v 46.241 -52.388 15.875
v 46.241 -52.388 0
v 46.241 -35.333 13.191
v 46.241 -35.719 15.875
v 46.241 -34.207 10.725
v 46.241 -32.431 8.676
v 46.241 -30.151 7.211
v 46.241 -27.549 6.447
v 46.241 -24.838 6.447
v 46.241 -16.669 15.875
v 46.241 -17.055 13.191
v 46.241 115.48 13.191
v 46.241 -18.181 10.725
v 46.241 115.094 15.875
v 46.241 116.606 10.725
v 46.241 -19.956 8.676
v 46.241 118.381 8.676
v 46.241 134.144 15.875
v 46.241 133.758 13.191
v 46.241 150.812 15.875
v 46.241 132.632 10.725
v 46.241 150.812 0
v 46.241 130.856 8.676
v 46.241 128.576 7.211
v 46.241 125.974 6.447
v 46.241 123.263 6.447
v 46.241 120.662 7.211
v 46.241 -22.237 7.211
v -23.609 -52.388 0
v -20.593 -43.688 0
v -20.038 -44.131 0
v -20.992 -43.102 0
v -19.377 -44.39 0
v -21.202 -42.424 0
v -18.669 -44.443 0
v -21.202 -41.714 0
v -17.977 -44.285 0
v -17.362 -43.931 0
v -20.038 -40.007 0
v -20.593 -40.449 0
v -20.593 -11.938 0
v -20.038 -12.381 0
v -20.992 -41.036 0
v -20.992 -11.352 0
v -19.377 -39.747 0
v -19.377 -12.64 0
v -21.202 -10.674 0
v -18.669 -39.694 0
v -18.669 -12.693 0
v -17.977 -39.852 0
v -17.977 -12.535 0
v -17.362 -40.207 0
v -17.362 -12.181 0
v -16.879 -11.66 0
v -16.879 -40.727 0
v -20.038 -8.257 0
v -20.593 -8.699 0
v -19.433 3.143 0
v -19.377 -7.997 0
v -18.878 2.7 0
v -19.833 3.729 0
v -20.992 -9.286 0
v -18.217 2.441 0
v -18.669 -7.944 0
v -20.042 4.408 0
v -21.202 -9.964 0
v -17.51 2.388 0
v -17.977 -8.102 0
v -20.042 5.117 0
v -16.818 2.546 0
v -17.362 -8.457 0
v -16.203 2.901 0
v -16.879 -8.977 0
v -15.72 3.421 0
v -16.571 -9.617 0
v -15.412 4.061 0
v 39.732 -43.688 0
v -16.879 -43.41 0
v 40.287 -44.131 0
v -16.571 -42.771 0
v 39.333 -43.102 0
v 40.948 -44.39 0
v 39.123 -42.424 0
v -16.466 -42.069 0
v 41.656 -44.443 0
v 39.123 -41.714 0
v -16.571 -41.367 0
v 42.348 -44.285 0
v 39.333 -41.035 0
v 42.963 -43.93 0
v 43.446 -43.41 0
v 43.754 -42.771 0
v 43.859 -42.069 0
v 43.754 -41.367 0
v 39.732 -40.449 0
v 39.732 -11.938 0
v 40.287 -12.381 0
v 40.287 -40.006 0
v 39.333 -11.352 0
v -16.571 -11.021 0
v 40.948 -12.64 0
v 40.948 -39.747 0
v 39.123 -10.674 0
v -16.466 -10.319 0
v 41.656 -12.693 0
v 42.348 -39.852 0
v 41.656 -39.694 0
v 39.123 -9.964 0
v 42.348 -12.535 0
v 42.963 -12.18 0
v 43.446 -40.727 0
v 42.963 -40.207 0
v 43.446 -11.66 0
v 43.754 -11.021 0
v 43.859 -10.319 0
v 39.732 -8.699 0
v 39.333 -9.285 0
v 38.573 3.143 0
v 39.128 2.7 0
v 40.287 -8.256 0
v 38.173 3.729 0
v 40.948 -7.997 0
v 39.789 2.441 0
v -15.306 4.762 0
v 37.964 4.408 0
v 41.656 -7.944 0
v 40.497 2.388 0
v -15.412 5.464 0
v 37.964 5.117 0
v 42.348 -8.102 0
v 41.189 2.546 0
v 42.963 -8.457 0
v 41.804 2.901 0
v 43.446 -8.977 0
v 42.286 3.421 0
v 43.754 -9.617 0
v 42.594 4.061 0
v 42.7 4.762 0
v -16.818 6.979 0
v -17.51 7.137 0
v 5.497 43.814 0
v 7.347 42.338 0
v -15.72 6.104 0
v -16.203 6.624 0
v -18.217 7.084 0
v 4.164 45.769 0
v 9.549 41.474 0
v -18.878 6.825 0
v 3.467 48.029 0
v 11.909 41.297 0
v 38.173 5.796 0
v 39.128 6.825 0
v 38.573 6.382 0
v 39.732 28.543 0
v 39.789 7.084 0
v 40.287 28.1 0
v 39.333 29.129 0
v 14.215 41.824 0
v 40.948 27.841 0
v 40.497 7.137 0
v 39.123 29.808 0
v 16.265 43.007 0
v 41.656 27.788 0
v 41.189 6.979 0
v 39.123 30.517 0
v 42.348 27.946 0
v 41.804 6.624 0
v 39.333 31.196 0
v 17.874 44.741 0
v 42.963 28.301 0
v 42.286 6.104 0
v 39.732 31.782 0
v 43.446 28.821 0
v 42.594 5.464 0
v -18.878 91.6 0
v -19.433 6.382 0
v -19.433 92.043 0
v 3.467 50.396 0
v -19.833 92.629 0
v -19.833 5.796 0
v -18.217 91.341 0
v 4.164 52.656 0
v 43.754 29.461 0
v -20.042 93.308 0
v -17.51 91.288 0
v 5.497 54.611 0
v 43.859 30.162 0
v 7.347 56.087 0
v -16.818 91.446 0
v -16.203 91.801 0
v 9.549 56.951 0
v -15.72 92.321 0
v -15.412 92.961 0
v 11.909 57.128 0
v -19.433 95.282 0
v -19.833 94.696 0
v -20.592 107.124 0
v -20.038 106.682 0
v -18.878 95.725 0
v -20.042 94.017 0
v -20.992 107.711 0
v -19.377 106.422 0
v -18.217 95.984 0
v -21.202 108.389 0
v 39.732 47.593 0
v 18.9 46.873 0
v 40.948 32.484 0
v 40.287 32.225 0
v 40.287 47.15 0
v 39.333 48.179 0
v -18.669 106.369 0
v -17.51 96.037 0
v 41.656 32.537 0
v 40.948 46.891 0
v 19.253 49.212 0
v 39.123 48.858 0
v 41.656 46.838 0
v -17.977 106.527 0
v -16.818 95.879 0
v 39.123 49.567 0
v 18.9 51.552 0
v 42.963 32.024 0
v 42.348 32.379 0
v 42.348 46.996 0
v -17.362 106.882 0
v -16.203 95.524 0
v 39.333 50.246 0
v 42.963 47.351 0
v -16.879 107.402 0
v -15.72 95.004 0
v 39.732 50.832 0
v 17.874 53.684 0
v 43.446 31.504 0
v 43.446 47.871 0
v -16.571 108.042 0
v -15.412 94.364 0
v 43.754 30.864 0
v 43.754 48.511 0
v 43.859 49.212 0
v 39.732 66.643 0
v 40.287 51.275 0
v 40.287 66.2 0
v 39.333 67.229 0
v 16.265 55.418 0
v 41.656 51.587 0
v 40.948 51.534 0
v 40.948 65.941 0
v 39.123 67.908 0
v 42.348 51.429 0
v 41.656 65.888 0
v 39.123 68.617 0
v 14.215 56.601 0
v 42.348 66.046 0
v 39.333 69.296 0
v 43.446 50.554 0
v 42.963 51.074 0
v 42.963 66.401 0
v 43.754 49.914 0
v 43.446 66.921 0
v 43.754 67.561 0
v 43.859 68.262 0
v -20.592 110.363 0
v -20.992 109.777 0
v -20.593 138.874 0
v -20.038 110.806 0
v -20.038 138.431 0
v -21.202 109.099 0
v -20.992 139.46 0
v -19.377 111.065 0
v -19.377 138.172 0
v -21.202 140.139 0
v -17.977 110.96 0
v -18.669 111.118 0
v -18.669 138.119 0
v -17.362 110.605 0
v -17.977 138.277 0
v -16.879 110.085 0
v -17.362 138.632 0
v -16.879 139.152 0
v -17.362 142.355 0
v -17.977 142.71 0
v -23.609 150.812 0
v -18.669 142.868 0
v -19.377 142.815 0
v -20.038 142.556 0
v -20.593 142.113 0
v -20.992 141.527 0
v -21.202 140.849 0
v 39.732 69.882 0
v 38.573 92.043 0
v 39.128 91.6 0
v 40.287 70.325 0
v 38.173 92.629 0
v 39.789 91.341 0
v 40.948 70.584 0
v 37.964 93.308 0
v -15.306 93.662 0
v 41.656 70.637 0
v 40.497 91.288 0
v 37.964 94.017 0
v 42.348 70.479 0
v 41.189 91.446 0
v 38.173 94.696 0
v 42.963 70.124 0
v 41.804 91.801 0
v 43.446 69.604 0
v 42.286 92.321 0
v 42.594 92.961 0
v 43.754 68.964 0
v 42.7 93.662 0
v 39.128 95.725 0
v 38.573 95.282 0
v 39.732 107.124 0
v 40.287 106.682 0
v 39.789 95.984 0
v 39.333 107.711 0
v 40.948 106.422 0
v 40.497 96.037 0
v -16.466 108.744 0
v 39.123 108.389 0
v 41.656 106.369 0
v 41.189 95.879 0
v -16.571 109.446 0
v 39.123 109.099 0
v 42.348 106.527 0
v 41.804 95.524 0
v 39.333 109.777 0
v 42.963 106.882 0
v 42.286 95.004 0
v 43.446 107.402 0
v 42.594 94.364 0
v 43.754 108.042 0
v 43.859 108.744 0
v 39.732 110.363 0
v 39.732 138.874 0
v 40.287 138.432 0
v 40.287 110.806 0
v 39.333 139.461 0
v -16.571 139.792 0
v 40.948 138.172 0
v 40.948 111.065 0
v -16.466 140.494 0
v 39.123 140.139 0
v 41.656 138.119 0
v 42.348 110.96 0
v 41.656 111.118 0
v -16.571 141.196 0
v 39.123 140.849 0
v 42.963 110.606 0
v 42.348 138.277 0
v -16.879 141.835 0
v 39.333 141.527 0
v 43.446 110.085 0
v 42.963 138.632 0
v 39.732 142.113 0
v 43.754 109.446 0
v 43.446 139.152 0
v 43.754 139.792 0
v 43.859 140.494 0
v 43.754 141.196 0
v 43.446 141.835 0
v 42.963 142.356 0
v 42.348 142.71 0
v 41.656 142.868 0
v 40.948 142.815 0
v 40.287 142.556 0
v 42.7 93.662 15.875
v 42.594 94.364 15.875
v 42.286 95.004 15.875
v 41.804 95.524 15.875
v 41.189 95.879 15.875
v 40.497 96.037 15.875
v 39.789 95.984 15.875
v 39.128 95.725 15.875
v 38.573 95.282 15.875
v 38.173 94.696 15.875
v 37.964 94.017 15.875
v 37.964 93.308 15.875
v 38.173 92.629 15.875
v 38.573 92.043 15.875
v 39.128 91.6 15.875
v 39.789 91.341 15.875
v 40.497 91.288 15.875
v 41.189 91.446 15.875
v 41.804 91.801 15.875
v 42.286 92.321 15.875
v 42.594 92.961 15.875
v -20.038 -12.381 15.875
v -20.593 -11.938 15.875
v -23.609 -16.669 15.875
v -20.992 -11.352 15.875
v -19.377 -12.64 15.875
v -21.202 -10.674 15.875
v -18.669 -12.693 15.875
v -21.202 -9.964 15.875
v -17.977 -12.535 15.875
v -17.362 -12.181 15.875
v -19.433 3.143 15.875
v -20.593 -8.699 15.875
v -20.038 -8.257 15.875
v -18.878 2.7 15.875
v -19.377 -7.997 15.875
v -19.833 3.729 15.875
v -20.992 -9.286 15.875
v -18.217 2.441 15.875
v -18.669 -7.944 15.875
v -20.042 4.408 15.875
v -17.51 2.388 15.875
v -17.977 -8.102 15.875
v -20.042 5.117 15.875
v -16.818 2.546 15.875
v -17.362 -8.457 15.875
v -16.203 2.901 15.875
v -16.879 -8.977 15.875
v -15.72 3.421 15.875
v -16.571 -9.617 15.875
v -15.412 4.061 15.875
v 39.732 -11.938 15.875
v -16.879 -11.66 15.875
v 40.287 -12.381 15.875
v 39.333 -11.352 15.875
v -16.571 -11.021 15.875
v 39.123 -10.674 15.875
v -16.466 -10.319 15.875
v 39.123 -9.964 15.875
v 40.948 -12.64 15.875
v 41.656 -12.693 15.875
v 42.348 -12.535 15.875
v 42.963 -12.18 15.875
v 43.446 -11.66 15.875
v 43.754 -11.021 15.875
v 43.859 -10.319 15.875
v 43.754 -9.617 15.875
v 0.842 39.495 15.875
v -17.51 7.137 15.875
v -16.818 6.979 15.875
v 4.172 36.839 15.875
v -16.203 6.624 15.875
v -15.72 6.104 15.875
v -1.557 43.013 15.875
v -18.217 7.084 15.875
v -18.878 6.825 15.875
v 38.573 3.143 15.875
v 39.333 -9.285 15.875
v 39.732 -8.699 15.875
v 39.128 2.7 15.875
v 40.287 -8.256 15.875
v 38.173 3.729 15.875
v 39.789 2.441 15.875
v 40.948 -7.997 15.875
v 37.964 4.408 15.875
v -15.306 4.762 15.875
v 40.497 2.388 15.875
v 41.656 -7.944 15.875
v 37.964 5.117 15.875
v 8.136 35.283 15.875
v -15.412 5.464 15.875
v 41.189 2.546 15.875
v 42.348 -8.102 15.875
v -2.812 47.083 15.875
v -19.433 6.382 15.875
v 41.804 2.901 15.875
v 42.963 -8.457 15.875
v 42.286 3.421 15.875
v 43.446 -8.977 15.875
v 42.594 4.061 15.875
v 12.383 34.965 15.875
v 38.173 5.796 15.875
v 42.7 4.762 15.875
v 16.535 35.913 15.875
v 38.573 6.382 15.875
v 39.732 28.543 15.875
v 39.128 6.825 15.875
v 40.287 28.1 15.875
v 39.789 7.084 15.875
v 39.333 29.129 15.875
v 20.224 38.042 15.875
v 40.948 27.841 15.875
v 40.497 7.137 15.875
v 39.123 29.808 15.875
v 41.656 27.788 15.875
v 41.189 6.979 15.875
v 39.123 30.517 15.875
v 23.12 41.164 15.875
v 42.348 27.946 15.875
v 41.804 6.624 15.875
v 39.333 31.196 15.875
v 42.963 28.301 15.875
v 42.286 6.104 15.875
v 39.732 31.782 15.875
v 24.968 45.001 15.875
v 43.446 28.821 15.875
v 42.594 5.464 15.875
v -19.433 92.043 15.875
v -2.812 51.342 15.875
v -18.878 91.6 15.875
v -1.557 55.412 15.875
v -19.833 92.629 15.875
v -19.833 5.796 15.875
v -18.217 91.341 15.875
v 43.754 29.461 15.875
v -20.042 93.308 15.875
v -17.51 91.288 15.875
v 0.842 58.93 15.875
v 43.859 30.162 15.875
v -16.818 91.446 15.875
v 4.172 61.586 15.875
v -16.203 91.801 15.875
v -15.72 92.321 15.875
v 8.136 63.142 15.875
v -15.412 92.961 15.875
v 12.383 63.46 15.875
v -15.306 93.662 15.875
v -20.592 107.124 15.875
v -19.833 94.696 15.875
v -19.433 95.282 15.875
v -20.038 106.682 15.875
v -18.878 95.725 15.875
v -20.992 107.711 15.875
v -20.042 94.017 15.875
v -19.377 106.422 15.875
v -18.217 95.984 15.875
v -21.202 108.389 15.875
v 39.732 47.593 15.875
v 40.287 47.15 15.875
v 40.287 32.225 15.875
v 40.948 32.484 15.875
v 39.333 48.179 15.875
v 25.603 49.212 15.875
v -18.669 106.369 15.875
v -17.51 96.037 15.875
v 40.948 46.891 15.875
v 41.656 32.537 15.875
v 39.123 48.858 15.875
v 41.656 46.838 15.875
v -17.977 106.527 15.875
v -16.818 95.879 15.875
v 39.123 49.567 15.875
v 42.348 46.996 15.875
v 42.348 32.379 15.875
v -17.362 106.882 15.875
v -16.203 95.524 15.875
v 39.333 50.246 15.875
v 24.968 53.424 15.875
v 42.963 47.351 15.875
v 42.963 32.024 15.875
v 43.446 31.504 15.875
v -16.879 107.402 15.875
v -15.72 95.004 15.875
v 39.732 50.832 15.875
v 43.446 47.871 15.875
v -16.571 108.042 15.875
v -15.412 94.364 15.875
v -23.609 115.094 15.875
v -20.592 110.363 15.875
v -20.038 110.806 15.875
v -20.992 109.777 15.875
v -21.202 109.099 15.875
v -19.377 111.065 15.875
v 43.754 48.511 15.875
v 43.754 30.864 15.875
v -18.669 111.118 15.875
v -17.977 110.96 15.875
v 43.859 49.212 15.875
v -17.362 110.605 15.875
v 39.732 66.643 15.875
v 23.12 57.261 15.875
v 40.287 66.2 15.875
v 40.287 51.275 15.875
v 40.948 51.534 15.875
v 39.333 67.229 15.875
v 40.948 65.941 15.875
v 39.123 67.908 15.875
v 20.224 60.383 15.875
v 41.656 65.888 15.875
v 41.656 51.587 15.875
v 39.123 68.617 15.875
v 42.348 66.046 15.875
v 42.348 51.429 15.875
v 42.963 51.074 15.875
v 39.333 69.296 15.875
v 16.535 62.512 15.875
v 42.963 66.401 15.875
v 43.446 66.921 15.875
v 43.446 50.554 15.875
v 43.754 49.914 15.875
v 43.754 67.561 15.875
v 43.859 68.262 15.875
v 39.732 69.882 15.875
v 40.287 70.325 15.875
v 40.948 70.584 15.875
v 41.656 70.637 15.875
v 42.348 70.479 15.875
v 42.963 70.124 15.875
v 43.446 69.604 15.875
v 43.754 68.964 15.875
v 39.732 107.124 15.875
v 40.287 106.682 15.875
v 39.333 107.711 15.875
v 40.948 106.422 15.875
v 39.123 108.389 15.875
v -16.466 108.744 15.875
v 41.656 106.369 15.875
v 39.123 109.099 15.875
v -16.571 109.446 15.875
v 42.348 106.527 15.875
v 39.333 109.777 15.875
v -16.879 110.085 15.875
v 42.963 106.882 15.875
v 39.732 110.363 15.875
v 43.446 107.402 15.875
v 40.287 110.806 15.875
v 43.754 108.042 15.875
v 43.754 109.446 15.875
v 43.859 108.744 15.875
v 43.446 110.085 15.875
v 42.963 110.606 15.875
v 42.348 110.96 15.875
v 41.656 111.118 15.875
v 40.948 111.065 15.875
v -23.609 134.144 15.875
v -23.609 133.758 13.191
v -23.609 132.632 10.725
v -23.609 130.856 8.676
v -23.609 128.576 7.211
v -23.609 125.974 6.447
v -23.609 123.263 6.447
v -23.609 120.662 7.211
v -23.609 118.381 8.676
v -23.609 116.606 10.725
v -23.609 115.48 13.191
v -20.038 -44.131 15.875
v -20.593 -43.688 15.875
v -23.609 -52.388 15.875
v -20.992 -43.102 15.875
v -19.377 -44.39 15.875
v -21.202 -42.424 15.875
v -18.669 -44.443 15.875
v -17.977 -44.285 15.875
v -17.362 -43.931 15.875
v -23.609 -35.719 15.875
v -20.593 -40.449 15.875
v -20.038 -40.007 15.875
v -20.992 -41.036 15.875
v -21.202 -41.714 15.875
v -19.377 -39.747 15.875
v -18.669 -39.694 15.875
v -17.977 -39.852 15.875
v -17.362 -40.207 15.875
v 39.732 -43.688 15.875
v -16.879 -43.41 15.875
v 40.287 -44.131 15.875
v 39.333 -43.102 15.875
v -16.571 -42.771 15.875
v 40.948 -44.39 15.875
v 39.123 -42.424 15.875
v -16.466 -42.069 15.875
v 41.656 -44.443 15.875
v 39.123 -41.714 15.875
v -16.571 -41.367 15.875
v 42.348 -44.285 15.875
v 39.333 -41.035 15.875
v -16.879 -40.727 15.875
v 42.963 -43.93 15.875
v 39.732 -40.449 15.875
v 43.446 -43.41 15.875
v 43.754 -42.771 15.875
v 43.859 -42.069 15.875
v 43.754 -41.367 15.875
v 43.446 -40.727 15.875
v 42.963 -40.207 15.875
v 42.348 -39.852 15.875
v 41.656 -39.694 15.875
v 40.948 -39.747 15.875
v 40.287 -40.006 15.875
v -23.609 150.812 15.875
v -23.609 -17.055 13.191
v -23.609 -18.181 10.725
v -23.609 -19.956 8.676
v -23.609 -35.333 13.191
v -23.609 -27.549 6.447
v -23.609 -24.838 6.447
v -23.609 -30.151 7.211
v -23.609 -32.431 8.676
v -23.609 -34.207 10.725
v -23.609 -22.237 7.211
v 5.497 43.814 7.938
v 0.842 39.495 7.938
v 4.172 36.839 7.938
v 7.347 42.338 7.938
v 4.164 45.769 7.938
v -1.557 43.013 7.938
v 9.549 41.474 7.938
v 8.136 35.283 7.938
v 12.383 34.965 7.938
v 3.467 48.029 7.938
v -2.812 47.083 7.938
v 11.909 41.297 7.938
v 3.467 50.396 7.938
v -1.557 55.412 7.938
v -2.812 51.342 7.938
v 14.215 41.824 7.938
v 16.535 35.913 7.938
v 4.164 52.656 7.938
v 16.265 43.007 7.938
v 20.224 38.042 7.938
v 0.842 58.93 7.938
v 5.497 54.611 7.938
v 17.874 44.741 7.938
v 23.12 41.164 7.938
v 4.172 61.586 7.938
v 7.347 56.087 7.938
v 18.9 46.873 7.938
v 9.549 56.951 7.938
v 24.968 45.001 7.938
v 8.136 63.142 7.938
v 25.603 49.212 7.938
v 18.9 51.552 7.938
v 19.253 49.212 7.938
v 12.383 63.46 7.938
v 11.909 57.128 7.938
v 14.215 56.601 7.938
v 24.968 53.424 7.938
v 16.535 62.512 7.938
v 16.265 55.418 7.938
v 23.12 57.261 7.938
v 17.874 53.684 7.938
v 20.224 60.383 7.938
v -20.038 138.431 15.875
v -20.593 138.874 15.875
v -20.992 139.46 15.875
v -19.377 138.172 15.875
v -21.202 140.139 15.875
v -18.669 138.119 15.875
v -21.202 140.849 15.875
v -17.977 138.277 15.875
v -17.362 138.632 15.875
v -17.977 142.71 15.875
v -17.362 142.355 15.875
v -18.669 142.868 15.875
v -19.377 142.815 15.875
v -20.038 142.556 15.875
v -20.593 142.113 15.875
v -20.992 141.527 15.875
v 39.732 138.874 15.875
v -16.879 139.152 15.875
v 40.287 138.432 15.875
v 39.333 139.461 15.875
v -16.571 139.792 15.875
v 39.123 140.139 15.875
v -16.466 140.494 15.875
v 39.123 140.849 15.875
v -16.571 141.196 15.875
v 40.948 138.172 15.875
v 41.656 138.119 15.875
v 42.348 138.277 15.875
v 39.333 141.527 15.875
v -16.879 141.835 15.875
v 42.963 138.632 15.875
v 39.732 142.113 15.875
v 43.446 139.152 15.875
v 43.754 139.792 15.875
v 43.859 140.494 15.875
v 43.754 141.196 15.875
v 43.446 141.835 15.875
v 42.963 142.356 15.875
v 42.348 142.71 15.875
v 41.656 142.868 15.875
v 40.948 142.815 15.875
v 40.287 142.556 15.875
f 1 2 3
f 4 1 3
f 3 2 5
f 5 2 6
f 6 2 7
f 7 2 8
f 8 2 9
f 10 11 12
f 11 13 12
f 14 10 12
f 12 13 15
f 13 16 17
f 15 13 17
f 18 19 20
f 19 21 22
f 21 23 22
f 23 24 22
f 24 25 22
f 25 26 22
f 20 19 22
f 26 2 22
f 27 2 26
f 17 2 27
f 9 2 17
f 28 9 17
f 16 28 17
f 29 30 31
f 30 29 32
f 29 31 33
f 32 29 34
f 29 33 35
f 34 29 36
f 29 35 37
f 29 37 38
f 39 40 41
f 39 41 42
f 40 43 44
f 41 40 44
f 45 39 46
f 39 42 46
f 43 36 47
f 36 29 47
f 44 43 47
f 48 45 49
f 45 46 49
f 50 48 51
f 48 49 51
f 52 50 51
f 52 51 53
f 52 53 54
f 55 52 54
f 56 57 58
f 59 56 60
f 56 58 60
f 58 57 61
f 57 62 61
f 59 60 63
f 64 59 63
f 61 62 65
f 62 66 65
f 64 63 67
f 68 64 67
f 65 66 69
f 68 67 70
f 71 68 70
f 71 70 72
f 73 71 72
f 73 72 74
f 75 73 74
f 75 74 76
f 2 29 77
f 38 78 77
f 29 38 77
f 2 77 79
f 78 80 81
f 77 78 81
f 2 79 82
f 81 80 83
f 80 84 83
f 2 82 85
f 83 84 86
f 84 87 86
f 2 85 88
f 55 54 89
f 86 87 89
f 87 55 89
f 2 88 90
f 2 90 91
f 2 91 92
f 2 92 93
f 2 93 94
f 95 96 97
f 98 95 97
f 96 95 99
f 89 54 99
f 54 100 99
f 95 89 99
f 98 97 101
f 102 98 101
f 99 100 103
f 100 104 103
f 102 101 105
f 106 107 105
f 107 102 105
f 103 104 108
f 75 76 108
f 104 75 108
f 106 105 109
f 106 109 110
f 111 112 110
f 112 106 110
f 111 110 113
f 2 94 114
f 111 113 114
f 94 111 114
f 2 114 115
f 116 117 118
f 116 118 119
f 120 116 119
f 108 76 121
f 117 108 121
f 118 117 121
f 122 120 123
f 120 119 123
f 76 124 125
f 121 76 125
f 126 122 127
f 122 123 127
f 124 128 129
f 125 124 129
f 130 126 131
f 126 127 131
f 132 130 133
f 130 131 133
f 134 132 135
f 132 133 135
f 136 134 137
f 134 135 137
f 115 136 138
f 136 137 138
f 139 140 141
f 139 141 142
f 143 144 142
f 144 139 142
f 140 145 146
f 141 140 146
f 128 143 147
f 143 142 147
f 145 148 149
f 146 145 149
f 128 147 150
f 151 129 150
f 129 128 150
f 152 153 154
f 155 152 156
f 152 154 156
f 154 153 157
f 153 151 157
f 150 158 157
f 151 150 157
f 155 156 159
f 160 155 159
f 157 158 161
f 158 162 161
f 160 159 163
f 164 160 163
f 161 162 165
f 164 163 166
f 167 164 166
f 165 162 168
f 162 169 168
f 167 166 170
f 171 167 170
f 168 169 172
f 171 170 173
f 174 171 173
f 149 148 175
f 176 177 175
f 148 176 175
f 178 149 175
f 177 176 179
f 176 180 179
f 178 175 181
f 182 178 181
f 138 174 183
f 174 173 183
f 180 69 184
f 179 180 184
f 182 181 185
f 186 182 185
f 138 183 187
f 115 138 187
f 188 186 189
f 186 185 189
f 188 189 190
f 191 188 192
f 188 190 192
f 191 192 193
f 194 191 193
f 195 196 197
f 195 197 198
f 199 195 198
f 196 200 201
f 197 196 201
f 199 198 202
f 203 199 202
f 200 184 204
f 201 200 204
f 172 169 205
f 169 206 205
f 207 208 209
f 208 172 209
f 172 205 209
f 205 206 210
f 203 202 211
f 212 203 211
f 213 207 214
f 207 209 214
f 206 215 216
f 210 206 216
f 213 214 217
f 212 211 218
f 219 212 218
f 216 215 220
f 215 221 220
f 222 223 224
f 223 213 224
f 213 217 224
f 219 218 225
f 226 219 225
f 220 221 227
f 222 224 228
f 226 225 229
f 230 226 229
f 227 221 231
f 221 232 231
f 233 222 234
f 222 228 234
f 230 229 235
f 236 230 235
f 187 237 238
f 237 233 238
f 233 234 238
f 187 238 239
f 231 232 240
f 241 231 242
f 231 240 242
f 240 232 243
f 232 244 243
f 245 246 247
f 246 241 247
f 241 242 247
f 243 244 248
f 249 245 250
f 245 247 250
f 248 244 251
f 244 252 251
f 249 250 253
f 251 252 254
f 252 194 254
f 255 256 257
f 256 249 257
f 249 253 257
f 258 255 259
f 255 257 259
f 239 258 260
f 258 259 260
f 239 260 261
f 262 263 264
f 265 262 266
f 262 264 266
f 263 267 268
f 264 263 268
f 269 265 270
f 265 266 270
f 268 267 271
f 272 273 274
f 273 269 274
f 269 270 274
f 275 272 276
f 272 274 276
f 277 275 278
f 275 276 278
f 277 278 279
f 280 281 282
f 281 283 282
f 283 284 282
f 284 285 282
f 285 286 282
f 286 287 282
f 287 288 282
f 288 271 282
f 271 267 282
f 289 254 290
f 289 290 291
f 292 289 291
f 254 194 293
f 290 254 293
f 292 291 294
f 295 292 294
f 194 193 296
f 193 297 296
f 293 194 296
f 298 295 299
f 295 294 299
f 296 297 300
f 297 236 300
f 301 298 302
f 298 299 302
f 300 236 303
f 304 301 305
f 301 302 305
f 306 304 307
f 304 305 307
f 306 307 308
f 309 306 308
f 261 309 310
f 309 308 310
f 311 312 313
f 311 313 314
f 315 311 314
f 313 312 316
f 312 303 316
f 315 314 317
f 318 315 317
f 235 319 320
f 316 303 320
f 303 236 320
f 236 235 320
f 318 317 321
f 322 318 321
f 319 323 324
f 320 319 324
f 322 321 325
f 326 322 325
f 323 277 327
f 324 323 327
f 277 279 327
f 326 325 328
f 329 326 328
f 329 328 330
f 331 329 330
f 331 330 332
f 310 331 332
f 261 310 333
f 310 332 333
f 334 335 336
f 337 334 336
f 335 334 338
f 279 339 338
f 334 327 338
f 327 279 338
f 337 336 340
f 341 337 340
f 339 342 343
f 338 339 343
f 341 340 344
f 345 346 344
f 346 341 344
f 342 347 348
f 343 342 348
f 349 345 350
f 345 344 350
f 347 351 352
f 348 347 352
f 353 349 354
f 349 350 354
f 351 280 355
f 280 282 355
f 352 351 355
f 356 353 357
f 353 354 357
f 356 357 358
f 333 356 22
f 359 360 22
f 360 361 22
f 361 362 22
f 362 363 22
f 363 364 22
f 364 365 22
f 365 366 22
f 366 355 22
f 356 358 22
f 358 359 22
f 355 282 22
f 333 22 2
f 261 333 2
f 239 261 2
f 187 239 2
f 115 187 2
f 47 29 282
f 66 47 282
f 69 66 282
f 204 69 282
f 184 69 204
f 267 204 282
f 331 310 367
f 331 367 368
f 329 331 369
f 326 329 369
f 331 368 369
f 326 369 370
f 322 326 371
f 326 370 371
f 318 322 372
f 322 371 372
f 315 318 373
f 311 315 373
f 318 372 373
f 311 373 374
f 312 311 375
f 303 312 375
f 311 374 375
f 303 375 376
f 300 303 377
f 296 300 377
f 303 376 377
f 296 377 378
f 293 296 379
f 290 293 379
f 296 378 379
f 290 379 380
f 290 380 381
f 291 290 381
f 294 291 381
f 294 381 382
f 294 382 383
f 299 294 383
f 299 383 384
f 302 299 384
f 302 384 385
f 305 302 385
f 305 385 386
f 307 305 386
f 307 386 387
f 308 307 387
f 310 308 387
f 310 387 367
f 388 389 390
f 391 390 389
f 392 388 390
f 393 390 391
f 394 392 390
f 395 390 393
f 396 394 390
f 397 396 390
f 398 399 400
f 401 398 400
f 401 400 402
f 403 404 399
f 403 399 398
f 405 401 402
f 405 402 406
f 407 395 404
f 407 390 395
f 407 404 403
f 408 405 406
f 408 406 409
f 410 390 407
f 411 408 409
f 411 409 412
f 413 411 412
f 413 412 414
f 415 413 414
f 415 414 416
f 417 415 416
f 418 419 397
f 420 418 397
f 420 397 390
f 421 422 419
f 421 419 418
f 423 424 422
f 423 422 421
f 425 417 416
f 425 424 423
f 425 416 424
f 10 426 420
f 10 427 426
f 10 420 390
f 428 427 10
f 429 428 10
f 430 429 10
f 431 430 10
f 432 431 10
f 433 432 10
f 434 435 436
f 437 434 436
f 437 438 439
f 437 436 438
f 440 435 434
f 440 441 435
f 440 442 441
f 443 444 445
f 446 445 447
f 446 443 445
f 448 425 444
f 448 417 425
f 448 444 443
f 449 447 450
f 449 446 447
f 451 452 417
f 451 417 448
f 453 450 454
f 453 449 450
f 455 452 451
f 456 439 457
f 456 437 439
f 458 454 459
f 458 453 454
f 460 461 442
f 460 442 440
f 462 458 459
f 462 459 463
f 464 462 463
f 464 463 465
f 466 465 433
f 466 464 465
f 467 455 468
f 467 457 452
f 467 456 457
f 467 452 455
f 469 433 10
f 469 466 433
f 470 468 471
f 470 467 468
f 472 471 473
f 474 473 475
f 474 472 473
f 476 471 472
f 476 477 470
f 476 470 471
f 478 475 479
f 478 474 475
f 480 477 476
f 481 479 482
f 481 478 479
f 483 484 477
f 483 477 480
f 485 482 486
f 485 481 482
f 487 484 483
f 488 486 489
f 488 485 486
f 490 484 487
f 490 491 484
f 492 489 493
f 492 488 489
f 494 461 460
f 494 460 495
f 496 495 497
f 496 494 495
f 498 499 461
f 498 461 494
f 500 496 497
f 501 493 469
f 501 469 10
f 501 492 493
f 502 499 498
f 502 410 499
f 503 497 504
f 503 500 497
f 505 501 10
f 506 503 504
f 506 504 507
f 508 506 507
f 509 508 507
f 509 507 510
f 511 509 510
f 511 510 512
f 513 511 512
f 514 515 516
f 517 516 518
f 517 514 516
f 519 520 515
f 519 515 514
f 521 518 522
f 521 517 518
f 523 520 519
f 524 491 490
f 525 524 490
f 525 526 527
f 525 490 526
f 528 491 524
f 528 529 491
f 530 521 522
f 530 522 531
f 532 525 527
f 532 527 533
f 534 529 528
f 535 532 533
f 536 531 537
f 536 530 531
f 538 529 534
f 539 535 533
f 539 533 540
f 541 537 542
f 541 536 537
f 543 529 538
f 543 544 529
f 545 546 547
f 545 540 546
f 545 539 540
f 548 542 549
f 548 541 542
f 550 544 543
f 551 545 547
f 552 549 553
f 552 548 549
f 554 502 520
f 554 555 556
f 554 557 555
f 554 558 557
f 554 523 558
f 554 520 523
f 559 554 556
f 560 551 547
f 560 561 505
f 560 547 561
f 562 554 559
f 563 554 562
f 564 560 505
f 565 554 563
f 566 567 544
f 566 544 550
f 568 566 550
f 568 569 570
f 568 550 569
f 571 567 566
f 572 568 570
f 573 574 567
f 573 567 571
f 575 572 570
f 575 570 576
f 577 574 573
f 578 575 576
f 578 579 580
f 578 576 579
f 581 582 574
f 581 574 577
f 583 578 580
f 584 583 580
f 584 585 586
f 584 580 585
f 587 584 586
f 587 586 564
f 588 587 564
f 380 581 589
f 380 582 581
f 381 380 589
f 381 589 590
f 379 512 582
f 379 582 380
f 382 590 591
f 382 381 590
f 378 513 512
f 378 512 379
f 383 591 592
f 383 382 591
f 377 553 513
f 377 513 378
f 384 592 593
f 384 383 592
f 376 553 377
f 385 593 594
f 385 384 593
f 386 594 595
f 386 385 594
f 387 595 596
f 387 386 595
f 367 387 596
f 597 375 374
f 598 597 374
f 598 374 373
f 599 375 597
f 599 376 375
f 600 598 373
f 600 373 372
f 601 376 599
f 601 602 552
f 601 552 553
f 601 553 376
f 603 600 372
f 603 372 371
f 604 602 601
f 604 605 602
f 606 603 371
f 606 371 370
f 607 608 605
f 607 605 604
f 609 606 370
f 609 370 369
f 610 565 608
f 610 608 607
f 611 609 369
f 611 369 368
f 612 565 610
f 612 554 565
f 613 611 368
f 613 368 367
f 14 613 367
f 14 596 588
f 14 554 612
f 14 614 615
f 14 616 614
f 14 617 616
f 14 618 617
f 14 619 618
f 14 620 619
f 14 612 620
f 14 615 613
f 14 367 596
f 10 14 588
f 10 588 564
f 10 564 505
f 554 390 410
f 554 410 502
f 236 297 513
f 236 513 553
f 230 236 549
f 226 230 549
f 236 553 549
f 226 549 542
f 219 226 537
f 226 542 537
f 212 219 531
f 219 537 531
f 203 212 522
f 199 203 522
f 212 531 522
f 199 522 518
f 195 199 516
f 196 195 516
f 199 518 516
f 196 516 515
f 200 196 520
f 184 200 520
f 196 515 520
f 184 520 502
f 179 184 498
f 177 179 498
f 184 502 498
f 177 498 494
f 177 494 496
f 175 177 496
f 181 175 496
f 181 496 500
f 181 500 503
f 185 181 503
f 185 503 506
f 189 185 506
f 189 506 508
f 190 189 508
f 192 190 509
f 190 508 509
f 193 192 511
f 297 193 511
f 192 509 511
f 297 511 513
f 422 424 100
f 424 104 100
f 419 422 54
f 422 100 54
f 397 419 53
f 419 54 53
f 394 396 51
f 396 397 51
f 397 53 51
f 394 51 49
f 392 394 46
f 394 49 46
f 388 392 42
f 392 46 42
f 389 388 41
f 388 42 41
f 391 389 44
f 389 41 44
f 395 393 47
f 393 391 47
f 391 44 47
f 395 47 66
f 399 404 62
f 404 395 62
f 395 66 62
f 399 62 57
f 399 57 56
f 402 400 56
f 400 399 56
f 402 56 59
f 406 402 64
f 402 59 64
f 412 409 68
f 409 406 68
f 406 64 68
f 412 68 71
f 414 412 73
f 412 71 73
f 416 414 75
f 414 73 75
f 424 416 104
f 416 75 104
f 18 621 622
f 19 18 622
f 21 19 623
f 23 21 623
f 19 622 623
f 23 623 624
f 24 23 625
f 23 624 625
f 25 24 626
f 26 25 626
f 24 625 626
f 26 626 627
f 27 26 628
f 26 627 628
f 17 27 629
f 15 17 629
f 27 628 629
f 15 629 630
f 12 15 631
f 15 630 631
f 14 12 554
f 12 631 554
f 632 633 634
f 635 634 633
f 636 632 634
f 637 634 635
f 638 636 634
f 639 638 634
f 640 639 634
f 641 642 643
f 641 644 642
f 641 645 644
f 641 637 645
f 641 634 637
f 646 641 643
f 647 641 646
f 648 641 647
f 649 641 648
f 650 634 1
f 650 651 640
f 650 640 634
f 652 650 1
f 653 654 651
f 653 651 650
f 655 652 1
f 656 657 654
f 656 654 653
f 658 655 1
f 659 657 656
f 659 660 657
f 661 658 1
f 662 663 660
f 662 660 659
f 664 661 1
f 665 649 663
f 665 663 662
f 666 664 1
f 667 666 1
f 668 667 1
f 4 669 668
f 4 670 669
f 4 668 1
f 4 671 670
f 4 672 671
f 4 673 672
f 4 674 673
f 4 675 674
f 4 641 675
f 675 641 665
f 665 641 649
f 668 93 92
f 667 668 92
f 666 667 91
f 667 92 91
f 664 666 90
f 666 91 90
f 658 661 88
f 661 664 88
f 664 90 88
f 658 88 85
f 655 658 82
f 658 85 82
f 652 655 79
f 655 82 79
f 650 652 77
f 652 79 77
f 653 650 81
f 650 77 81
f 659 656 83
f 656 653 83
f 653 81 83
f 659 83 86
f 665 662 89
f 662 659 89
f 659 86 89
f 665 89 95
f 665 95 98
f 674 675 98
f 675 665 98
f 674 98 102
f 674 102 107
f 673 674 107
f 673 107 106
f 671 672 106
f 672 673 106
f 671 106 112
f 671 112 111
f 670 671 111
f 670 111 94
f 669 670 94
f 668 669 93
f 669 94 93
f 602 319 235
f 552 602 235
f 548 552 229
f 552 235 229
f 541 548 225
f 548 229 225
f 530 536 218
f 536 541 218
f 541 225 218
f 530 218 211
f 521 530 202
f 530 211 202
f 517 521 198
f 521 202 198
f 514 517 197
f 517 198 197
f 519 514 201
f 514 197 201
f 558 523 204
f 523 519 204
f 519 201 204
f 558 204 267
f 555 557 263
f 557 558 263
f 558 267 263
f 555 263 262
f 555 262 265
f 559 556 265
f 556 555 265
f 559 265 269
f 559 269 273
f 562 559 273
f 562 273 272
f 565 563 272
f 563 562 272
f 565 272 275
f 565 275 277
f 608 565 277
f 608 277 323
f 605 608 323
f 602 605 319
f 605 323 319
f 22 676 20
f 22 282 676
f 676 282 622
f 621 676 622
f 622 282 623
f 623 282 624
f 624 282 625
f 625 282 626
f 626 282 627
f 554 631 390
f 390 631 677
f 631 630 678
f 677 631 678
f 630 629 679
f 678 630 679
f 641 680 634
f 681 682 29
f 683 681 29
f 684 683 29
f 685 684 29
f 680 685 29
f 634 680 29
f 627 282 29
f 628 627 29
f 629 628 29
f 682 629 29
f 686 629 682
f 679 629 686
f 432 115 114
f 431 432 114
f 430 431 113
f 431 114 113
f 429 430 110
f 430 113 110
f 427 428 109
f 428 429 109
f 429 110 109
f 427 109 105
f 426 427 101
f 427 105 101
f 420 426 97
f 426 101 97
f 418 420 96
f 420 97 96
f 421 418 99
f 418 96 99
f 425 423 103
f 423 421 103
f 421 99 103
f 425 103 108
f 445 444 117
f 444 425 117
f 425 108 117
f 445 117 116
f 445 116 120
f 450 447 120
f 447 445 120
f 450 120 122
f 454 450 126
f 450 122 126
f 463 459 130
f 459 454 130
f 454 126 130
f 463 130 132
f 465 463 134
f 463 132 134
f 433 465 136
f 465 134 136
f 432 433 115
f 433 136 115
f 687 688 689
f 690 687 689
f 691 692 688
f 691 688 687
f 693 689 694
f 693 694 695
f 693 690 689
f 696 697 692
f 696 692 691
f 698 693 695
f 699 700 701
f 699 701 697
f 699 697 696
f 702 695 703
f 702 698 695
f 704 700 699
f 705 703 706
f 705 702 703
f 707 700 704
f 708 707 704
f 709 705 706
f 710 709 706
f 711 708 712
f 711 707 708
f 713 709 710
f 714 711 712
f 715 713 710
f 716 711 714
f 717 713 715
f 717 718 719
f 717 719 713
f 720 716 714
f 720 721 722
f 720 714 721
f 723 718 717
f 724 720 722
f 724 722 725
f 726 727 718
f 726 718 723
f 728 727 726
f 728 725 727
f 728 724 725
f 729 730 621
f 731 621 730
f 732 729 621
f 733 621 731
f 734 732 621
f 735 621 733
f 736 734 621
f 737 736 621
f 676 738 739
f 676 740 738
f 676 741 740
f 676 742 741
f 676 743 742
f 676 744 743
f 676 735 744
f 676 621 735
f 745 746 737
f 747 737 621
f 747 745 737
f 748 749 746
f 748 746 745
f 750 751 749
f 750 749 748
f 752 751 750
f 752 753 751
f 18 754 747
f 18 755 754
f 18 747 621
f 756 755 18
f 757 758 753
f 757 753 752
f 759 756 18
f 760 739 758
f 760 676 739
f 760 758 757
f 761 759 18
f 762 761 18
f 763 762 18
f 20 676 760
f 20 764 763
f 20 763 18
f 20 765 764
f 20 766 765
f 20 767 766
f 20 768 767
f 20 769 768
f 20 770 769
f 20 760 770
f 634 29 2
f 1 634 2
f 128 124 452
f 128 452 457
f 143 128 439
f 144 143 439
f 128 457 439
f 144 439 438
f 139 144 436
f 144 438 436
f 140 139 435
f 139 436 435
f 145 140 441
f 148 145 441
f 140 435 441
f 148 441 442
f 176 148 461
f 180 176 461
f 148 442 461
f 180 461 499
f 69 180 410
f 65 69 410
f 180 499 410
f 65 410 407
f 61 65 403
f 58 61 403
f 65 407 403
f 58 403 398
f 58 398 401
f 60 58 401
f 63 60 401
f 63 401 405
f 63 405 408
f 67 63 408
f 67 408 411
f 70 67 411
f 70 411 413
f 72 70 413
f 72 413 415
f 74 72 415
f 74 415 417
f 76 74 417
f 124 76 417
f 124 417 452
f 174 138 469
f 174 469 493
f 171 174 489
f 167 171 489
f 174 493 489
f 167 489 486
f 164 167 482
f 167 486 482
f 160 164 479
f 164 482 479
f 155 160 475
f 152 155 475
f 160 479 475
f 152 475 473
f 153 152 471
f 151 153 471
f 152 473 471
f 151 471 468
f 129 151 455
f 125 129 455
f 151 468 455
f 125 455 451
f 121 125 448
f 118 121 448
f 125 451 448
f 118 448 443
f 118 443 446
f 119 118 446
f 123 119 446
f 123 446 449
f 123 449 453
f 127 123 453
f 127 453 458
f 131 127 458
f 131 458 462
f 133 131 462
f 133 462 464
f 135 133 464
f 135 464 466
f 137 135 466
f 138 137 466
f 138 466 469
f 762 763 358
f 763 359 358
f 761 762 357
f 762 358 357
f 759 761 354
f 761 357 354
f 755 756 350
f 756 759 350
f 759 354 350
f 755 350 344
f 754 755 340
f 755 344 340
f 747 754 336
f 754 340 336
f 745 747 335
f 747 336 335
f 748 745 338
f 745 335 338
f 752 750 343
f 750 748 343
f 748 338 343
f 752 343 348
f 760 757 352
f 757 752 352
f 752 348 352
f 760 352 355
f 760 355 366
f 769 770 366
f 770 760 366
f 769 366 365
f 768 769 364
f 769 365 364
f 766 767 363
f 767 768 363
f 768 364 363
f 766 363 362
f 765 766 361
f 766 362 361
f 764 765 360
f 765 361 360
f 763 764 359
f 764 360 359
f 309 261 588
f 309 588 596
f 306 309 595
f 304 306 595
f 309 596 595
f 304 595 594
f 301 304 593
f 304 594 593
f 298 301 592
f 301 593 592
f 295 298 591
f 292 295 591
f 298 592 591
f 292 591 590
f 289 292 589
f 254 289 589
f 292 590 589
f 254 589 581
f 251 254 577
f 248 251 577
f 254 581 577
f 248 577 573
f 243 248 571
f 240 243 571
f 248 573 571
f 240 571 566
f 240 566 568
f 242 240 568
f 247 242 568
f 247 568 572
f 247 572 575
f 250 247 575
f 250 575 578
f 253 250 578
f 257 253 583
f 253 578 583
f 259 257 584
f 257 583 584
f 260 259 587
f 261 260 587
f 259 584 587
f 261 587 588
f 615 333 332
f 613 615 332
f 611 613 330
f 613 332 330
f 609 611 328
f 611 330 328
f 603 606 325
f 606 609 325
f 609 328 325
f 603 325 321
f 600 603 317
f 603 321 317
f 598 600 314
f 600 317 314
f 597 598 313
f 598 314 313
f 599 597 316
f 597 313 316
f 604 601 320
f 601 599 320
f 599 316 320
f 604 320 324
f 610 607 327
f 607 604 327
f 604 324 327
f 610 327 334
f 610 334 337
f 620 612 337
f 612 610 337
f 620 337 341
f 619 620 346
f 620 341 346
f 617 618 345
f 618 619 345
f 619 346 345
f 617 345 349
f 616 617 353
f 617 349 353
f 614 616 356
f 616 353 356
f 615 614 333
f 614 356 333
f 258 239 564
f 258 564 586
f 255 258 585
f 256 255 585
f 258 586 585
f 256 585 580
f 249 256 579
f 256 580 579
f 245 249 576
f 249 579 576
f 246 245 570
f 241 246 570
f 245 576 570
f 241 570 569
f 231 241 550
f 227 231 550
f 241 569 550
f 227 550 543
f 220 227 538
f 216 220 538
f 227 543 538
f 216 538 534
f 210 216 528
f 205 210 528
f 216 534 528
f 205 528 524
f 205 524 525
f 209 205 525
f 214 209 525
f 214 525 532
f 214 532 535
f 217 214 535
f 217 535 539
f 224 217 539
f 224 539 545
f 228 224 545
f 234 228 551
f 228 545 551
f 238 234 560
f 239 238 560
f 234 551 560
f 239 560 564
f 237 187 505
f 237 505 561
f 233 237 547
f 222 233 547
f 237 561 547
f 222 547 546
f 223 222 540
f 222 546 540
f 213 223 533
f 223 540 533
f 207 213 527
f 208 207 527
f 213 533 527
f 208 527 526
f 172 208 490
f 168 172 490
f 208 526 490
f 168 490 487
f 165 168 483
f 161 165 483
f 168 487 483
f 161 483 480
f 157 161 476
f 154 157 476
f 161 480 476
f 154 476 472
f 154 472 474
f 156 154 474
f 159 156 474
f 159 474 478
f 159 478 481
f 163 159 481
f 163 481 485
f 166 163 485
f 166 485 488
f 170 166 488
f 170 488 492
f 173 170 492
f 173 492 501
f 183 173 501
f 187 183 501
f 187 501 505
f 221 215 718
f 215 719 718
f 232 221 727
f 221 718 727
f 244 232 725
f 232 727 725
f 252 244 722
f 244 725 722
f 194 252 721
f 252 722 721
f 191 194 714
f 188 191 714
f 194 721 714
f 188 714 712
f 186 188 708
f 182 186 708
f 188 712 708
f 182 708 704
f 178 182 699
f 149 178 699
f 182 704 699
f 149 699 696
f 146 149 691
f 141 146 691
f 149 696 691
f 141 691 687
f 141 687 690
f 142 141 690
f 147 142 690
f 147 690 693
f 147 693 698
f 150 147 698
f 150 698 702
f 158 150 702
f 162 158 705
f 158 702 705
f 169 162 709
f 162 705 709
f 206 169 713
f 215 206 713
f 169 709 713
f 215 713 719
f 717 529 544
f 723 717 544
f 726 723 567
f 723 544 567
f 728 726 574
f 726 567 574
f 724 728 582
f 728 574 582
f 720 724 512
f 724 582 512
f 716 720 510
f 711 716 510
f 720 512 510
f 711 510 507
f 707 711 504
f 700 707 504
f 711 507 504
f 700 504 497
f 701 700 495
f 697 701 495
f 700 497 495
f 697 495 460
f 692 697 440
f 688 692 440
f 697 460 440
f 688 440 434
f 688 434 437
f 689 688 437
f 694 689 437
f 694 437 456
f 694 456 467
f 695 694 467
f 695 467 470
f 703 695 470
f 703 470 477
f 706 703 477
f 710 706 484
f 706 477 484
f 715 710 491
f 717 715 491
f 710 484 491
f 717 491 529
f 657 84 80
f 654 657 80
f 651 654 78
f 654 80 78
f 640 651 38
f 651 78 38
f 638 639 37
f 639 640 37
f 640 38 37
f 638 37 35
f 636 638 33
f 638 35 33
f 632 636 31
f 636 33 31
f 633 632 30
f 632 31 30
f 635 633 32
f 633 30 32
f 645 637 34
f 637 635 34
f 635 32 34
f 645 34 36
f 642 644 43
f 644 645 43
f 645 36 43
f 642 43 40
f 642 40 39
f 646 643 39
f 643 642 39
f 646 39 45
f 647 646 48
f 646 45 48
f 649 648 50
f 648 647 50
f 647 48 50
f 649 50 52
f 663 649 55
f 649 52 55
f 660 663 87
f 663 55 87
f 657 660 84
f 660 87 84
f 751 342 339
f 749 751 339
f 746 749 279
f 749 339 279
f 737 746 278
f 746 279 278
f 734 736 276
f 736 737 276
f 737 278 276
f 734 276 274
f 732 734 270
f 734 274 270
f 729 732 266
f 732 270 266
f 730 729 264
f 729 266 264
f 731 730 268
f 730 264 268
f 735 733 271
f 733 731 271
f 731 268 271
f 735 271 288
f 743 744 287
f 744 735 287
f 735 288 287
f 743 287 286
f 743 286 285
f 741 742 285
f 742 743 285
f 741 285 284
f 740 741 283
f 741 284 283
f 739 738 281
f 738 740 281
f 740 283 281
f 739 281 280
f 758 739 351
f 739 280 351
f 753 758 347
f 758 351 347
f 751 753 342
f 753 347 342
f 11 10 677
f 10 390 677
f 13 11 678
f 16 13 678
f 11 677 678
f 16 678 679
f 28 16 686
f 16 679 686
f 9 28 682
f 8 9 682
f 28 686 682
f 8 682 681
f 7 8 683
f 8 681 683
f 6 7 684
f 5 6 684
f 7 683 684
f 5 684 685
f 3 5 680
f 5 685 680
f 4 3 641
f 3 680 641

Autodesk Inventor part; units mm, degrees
ref_plane "YZ Plane" through (0, 0, 0) normal (1, 0, 0) x (0, 1, 0)
ref_plane "XZ Plane" through (0, 0, 0) normal (0, 1, 0) x (-1, 0, 0)
ref_plane "XY Plane" through (0, 0, 0) normal (0, 0, 1) x (1, 0, 0)
sketch "Sketch1" plane through (0, 0, 0) normal (0, 0, 1) x (1, 0, 0)
  line L0 (-23.6094, 98.425) -> (-0.1834, 98.425) projected
  line L1 (-0.1834, 150.8125) -> (-0.1834, 98.425) projected
  line L2 (-23.6094, 150.8125) -> (-0.1834, 150.8125) projected
  line L3 (-23.6094, 150.8125) -> (-23.6094, 98.425) projected
  circle A0 centre (-18.8469, 140.4937) radius 2.3813 projected
  circle A1 centre (-18.8469, 108.7437) radius 2.3812 projected
  line L4 (-23.6094, -52.3875) -> (-0.1834, -52.3875) projected
  line L5 (-0.1834, 0) -> (-0.1834, -52.3875) projected
  line L6 (-23.6094, 0) -> (0, 0) projected
  line L7 (-23.6094, 0) -> (-23.6094, -52.3875) projected
  circle A2 centre (-18.8469, -10.3188) radius 2.3813 projected
  circle A3 centre (-18.8469, -42.0688) radius 2.3813 projected
  line L8 (22.8147, 98.425) -> (46.2406, 98.425) projected
  line L9 (46.2406, 150.8125) -> (46.2406, 98.425) projected
  line L10 (22.8147, 150.8125) -> (46.2406, 150.8125) projected
  line L11 (22.8147, 150.8125) -> (22.8147, 98.425) projected
  circle A4 centre (41.4781, 140.4938) radius 2.3813 projected
  circle A5 centre (41.4781, 108.7438) radius 2.3813 projected
  line L12 (22.8147, -52.3875) -> (46.2406, -52.3875) projected
  line L13 (46.2406, 0) -> (46.2406, -52.3875) projected
  line L14 (22.8147, 0) -> (46.2406, 0) projected
  line L15 (22.8147, 0) -> (22.8147, -52.3875) projected
  circle A6 centre (41.4781, -10.3187) radius 2.3813 projected
  circle A7 centre (41.4781, -42.0687) radius 2.3813 projected
  line L16 (22.8147, 150.8125) -> (-0.1834, 150.8125)
  line L17 (22.8147, -52.3875) -> (-0.1834, -52.3875)
  line L18 (46.2406, 0) -> (46.2406, 98.425)
  line L19 (-23.6094, 0) -> (-23.6094, 98.425)
extrude "Extrusion1" add sketch "Sketch1" along normal blind 15.875
sketch "Sketch2" plane through (-23.6094, -52.3875, 0) normal (-1, 0, 0) x (0, 0, 1)
  line L0 (15.875, 195.2625) -> (15.875, 190.5) projected
  line L1 (15.875, 163.5125) -> (15.875, 158.75) projected
  line L2 (15.875, 44.45) -> (15.875, 39.6875) projected
  line L3 (15.875, 190.5) -> (15.875, 163.5125) construction
  line L4 (15.875, 12.7) -> (0, 12.7) construction
  line L5 (15.875, 12.7) -> (15.875, 39.6875) construction
  line L6 (22.1465, 177.0062) -> (15.875, 177.0062)
  line L7 (15.875, 0) -> (15.875, 203.2) projected
  line L8 (24.8676, 26.1938) -> (15.875, 26.1938)
  line L9 (15.875, 203.2) -> (15.875, 0) projected
  circle A0 centre (15.875, 177.0062) radius 9.525
  circle A1 centre (15.875, 26.1938) radius 9.525
  point P0 (0, 52.3875)
  point P1 (15.875, 35.7188)
  point P2 (15.875, 16.6688)
  point P3 (15.875, 186.5312)
  point P4 (15.875, 167.4812)
  dimension "d2" = 19.05
  dimension "d3" = 19.05
extrude "Extrusion2" cut sketch "Sketch2" against normal blind 76.2 contours L7 A1 | A0 L7 picked at (15.1152, 19.9361) picked at (15.1152, 170.7485)
sketch "Sketch3" plane through (0, 0, 15.875) normal (0, 0, 1) x (1, 0, 0)
  circle A0 centre (41.4781, 108.7438) radius 2.3813 construction
  circle A1 centre (41.4781, -10.3187) radius 2.3813 construction
  line L0 (41.4781, 108.7438) -> (41.4781, -10.3187) construction
  circle A2 centre (41.4781, 49.2125) radius 2.3813 construction
  circle A3 centre (41.4781, 30.1625) radius 2.3813 construction
  circle A4 centre (41.4781, 68.2625) radius 2.3813 construction
  circle A5 centre (41.4781, 49.2125) radius 2.3813 construction
  circle A6 centre (41.4781, 68.2625) radius 2.3813
  circle A7 centre (41.4781, 49.2125) radius 2.3813
  circle A8 centre (41.4781, 30.1625) radius 2.3813
  point P0 (0, 0)
  dimension "d8" = 19.05
  dimension "d11" = 19.05
extrude "Extrusion3" cut sketch "Sketch3" against normal blind 76.2
sketch "Sketch4" plane through (0, 0, 15.875) normal (0, 0, 1) x (1, 0, 0)
  circle A0 centre (11.3156, 49.2125) radius 14.2875
  line L0 (-23.6094, 115.0937) -> (-23.6094, -16.6688) projected
  point P0 (0, 0)
  dimension "d16" = 34.925
  dimension "d17" = 28.575
extrude "Extrusion4" cut sketch "Sketch4" against normal blind 7.9375
sketch "Sketch5" plane through (11.3156, 49.2125, 7.9375) normal (0, 0, 1) x (1, 0, 0)
  circle A0 centre (0, 0) radius 7.9375
  point P0 (-11.3156, -49.2125)
  dimension "d20" = 15.875
extrude "Extrusion5" cut sketch "Sketch5" against normal blind 7.9375
sketch "Sketch6" plane through (0, 0, 15.875) normal (0, 0, 1) x (1, 0, 0)
  line L0 (-23.6094, 100.0125) -> (46.2406, 100.0125) projected
  line L1 (46.2406, -1.5875) -> (-23.6094, -1.5875) projected
  circle A0 centre (11.3156, 49.2125) radius 37.465 projected
  circle A1 centre (40.3188, 93.6625) radius 2.3813
  line L2 (48.7806, 49.2125) -> (-26.1494, 49.2125) construction
  line L3 (11.3156, 100.0125) -> (11.3156, -1.5875) construction
  circle A2 centre (40.3188, 4.7625) radius 2.3813
  circle A3 centre (-17.6876, 93.6625) radius 2.3813
  circle A4 centre (-17.6876, 4.7625) radius 2.3813
  point P0 (0, 0)
  dimension "d23" = 4.7625
  dimension "d24" = 6.35
extrude "Extrusion6" cut sketch "Sketch6" against normal blind 19.05 contours A1 | A2 | A3 | A4
sketch "Sketch7" plane through (0, 0, 0) normal (0, 0, -1) x (-1, 0, 0)
  point P0 (0, 0)
properties part number "YClamp"
